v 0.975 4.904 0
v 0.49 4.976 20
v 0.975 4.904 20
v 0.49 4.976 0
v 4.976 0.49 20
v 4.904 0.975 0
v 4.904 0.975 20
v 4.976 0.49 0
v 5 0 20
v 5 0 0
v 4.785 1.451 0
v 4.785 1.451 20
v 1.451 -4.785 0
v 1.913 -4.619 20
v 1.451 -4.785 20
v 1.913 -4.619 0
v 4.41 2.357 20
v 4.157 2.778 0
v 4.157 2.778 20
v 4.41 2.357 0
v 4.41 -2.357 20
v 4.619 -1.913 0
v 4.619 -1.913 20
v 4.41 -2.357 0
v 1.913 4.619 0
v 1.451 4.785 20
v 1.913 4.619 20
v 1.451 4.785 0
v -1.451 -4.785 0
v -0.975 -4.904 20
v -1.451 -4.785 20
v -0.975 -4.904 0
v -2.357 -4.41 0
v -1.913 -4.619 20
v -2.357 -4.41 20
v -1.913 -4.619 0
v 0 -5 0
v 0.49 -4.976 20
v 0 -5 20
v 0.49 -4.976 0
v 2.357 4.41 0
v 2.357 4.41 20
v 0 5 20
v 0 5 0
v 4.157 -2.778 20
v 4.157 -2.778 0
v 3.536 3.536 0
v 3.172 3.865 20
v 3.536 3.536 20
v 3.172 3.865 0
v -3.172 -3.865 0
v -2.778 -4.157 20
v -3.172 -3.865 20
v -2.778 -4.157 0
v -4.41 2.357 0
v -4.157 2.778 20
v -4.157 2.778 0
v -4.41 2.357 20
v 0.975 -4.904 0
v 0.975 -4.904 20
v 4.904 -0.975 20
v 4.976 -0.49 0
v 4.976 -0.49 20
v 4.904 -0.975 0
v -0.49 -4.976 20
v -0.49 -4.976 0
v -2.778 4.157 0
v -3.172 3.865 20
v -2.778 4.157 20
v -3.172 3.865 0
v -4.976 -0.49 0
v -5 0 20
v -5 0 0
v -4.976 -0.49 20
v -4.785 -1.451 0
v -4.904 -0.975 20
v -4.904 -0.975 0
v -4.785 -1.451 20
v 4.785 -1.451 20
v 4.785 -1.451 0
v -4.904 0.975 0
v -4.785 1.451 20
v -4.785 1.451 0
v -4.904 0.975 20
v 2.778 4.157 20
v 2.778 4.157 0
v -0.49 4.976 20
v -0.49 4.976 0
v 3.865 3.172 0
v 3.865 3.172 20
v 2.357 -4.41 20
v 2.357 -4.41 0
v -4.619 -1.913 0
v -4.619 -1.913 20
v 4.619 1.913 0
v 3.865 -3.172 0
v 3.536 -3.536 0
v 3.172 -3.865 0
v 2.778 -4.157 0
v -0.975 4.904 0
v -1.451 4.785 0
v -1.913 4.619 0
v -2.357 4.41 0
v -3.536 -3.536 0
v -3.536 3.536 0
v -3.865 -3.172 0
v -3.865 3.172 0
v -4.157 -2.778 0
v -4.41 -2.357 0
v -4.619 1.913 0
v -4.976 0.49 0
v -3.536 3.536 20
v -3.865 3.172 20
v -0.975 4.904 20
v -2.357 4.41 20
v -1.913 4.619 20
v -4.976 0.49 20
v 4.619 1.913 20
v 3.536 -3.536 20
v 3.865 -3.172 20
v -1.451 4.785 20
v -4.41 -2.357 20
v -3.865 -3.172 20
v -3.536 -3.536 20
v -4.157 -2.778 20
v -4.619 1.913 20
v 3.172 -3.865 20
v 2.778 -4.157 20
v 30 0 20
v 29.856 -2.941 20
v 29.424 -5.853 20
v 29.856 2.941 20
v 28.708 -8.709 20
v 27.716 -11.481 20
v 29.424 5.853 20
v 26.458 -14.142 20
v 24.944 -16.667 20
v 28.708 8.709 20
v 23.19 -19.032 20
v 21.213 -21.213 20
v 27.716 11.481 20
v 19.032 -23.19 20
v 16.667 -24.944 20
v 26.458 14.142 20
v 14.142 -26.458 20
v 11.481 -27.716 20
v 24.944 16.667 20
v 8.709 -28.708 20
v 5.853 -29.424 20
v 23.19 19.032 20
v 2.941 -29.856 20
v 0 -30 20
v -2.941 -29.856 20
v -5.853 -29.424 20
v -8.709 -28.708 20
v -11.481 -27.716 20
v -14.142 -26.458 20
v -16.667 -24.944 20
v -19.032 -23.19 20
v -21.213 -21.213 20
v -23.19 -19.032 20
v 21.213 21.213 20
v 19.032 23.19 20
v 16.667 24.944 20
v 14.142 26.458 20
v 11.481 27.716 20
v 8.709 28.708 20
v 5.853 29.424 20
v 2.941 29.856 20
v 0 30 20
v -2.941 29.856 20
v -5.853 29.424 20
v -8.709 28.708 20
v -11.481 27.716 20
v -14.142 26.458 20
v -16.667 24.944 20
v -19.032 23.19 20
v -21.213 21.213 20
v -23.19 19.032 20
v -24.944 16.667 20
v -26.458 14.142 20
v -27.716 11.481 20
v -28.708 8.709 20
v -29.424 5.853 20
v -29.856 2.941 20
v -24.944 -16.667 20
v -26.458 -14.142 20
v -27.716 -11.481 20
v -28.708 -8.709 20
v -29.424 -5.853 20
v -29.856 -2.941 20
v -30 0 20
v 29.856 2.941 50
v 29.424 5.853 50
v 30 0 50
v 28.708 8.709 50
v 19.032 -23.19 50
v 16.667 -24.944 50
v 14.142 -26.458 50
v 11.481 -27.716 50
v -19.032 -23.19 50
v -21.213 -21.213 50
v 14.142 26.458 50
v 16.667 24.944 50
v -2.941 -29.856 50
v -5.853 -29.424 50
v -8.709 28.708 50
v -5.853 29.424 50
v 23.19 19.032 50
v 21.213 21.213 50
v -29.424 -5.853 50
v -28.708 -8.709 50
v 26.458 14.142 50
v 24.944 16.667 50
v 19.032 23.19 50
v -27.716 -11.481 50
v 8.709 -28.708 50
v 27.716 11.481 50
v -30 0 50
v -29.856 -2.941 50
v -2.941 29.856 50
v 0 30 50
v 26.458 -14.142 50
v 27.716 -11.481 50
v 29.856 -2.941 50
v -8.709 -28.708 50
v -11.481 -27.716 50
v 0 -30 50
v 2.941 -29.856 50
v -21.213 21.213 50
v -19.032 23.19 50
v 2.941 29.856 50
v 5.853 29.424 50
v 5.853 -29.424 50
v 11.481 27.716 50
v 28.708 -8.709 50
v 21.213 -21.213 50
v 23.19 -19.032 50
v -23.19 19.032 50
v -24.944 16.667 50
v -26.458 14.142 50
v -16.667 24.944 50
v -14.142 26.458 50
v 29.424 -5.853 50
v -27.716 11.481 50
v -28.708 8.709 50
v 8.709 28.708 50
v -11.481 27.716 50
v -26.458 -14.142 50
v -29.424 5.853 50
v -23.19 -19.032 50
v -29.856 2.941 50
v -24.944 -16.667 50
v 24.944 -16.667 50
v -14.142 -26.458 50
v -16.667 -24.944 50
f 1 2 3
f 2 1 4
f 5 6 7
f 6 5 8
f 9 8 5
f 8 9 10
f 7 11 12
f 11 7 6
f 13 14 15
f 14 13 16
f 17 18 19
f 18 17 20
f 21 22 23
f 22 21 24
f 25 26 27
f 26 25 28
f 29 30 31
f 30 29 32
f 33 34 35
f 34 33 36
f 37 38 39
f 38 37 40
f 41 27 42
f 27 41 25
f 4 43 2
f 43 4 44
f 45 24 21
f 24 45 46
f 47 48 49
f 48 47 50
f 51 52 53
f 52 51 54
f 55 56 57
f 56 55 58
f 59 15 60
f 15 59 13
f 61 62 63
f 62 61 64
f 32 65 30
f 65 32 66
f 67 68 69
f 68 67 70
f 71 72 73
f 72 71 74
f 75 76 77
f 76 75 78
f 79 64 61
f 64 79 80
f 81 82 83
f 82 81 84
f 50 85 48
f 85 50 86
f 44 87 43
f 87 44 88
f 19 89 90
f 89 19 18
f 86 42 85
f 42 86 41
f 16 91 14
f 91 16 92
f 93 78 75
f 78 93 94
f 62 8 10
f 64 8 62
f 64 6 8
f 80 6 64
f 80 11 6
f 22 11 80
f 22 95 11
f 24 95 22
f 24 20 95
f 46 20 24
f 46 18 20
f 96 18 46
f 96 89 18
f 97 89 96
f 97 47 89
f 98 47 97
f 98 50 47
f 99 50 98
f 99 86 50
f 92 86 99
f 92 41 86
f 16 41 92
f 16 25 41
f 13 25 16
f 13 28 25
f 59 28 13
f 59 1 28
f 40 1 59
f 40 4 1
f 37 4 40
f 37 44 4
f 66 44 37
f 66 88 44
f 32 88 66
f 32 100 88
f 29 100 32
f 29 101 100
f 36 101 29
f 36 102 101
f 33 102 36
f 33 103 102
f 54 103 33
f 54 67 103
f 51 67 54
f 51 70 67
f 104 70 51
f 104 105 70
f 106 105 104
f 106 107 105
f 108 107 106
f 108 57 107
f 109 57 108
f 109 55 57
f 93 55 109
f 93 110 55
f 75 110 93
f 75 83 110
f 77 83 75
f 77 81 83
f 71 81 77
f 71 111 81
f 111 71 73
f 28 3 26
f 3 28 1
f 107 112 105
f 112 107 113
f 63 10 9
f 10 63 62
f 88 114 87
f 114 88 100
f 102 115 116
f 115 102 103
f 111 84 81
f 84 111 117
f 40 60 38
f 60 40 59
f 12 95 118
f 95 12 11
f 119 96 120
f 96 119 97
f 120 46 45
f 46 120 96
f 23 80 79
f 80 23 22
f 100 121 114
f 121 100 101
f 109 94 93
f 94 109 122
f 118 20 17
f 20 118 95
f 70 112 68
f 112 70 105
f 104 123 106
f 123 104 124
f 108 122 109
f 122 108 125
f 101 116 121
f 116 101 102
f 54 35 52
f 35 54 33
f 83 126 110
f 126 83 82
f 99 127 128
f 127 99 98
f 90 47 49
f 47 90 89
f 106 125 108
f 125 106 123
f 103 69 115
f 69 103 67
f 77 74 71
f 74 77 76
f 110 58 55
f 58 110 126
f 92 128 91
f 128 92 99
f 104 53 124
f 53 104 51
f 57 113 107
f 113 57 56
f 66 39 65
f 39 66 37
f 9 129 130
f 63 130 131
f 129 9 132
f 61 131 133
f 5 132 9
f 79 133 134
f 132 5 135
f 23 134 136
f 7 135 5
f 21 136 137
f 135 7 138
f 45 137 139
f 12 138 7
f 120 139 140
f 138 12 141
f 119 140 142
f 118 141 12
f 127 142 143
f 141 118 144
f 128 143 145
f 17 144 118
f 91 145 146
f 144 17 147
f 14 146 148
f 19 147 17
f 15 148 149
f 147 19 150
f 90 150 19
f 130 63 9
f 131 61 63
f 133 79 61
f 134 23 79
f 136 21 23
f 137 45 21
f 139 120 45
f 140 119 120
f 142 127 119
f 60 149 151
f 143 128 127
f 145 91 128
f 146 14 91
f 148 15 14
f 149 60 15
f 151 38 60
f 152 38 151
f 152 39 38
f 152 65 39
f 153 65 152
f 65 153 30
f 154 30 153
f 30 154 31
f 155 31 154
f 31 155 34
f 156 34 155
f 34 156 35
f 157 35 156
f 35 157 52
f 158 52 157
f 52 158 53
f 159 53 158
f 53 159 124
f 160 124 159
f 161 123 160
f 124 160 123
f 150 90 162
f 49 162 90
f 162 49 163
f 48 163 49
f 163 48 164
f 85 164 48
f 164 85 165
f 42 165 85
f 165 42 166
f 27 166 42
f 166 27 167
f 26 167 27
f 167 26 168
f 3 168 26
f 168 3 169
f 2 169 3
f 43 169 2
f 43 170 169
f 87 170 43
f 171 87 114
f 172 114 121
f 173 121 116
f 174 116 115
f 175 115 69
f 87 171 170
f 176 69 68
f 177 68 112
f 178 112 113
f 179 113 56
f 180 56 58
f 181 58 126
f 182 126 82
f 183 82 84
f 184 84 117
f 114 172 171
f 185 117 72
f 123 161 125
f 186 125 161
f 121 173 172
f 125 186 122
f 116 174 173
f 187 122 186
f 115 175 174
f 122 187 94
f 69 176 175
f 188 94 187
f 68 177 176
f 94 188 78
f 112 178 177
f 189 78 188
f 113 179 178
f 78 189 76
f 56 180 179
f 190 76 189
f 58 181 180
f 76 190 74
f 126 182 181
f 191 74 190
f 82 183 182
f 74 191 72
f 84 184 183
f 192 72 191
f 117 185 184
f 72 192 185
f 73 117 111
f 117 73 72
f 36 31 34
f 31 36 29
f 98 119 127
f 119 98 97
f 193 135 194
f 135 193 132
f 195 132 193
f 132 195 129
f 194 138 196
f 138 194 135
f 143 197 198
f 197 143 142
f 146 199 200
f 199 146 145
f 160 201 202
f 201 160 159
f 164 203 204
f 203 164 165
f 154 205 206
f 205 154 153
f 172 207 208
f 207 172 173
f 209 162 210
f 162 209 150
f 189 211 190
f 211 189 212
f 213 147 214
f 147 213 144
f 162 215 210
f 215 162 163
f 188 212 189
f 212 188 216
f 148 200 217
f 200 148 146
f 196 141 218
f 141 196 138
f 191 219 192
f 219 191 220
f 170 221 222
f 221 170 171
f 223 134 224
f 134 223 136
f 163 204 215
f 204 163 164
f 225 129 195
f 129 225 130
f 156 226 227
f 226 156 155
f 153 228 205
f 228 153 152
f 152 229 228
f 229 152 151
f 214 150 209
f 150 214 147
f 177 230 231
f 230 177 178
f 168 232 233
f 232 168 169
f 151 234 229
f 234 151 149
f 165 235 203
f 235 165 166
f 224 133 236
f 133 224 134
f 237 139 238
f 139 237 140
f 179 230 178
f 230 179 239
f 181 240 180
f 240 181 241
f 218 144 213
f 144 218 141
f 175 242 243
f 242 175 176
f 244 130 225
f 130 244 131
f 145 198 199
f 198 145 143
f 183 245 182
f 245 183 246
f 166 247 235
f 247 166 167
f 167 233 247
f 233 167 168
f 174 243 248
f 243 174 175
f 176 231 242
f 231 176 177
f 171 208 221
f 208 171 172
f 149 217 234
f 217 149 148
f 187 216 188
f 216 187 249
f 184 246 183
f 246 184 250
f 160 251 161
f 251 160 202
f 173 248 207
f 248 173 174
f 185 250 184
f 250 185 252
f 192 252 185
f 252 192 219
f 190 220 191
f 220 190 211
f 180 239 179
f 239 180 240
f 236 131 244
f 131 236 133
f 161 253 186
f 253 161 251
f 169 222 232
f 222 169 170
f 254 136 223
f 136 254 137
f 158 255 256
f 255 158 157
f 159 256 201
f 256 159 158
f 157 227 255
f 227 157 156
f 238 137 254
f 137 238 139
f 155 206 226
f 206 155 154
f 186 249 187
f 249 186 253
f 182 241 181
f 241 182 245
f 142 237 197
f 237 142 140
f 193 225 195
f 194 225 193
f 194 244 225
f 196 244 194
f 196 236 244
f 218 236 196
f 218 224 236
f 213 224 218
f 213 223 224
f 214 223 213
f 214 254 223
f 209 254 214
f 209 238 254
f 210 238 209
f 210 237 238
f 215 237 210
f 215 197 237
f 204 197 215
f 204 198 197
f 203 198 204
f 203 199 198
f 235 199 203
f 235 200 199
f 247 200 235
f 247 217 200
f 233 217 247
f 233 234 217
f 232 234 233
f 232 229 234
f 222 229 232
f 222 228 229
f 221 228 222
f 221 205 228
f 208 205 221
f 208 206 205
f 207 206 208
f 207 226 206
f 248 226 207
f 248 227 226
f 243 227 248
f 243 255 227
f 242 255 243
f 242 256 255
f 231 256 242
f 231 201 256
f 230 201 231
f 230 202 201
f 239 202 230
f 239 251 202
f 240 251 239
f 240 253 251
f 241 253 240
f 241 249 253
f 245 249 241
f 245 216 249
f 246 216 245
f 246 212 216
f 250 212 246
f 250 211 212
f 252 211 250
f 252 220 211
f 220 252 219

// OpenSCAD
// Lab funnel design
// Dimensions in millimeters

// Main dimensions
spout_height = 20;
cone_height = 30;
total_height = spout_height + cone_height;
spout_outer_dia = 10;
spout_inner_dia = 6.8;
cone_outer_dia = 60;
wall_thickness = 1.6;

// Derived dimensions
spout_radius = spout_outer_dia / 2;
spout_inner_radius = spout_inner_dia / 2;
cone_radius = cone_outer_dia / 2;
cone_inner_radius = cone_outer_dia / 2 - wall_thickness;

// Create the funnel
union() {
    // Outer spout
    cylinder(r = spout_radius, h = spout_height, $fn = 64);
    
    // Outer cone
    translate([0, 0, spout_height]) {
        cylinder(r = cone_radius, h = cone_height, $fn = 64);
    }
    
    // Inner spout
    difference() {
        cylinder(r = spout_inner_radius, h = spout_height + 0.01, $fn = 64);
        translate([0, 0, -0.01]) {
            cylinder(r = spout_inner_radius, h = spout_height + 0.02, $fn = 64);
        }
    }
    
    // Inner cone
    difference() {
        translate([0, 0, spout_height]) {
            cylinder(r = cone_inner_radius, h = cone_height + 0.01, $fn = 64);
        }
        translate([0, 0, spout_height - 0.01]) {
            cylinder(r = cone_inner_radius, h = cone_height + 0.02, $fn = 64);
        }
    }
}
